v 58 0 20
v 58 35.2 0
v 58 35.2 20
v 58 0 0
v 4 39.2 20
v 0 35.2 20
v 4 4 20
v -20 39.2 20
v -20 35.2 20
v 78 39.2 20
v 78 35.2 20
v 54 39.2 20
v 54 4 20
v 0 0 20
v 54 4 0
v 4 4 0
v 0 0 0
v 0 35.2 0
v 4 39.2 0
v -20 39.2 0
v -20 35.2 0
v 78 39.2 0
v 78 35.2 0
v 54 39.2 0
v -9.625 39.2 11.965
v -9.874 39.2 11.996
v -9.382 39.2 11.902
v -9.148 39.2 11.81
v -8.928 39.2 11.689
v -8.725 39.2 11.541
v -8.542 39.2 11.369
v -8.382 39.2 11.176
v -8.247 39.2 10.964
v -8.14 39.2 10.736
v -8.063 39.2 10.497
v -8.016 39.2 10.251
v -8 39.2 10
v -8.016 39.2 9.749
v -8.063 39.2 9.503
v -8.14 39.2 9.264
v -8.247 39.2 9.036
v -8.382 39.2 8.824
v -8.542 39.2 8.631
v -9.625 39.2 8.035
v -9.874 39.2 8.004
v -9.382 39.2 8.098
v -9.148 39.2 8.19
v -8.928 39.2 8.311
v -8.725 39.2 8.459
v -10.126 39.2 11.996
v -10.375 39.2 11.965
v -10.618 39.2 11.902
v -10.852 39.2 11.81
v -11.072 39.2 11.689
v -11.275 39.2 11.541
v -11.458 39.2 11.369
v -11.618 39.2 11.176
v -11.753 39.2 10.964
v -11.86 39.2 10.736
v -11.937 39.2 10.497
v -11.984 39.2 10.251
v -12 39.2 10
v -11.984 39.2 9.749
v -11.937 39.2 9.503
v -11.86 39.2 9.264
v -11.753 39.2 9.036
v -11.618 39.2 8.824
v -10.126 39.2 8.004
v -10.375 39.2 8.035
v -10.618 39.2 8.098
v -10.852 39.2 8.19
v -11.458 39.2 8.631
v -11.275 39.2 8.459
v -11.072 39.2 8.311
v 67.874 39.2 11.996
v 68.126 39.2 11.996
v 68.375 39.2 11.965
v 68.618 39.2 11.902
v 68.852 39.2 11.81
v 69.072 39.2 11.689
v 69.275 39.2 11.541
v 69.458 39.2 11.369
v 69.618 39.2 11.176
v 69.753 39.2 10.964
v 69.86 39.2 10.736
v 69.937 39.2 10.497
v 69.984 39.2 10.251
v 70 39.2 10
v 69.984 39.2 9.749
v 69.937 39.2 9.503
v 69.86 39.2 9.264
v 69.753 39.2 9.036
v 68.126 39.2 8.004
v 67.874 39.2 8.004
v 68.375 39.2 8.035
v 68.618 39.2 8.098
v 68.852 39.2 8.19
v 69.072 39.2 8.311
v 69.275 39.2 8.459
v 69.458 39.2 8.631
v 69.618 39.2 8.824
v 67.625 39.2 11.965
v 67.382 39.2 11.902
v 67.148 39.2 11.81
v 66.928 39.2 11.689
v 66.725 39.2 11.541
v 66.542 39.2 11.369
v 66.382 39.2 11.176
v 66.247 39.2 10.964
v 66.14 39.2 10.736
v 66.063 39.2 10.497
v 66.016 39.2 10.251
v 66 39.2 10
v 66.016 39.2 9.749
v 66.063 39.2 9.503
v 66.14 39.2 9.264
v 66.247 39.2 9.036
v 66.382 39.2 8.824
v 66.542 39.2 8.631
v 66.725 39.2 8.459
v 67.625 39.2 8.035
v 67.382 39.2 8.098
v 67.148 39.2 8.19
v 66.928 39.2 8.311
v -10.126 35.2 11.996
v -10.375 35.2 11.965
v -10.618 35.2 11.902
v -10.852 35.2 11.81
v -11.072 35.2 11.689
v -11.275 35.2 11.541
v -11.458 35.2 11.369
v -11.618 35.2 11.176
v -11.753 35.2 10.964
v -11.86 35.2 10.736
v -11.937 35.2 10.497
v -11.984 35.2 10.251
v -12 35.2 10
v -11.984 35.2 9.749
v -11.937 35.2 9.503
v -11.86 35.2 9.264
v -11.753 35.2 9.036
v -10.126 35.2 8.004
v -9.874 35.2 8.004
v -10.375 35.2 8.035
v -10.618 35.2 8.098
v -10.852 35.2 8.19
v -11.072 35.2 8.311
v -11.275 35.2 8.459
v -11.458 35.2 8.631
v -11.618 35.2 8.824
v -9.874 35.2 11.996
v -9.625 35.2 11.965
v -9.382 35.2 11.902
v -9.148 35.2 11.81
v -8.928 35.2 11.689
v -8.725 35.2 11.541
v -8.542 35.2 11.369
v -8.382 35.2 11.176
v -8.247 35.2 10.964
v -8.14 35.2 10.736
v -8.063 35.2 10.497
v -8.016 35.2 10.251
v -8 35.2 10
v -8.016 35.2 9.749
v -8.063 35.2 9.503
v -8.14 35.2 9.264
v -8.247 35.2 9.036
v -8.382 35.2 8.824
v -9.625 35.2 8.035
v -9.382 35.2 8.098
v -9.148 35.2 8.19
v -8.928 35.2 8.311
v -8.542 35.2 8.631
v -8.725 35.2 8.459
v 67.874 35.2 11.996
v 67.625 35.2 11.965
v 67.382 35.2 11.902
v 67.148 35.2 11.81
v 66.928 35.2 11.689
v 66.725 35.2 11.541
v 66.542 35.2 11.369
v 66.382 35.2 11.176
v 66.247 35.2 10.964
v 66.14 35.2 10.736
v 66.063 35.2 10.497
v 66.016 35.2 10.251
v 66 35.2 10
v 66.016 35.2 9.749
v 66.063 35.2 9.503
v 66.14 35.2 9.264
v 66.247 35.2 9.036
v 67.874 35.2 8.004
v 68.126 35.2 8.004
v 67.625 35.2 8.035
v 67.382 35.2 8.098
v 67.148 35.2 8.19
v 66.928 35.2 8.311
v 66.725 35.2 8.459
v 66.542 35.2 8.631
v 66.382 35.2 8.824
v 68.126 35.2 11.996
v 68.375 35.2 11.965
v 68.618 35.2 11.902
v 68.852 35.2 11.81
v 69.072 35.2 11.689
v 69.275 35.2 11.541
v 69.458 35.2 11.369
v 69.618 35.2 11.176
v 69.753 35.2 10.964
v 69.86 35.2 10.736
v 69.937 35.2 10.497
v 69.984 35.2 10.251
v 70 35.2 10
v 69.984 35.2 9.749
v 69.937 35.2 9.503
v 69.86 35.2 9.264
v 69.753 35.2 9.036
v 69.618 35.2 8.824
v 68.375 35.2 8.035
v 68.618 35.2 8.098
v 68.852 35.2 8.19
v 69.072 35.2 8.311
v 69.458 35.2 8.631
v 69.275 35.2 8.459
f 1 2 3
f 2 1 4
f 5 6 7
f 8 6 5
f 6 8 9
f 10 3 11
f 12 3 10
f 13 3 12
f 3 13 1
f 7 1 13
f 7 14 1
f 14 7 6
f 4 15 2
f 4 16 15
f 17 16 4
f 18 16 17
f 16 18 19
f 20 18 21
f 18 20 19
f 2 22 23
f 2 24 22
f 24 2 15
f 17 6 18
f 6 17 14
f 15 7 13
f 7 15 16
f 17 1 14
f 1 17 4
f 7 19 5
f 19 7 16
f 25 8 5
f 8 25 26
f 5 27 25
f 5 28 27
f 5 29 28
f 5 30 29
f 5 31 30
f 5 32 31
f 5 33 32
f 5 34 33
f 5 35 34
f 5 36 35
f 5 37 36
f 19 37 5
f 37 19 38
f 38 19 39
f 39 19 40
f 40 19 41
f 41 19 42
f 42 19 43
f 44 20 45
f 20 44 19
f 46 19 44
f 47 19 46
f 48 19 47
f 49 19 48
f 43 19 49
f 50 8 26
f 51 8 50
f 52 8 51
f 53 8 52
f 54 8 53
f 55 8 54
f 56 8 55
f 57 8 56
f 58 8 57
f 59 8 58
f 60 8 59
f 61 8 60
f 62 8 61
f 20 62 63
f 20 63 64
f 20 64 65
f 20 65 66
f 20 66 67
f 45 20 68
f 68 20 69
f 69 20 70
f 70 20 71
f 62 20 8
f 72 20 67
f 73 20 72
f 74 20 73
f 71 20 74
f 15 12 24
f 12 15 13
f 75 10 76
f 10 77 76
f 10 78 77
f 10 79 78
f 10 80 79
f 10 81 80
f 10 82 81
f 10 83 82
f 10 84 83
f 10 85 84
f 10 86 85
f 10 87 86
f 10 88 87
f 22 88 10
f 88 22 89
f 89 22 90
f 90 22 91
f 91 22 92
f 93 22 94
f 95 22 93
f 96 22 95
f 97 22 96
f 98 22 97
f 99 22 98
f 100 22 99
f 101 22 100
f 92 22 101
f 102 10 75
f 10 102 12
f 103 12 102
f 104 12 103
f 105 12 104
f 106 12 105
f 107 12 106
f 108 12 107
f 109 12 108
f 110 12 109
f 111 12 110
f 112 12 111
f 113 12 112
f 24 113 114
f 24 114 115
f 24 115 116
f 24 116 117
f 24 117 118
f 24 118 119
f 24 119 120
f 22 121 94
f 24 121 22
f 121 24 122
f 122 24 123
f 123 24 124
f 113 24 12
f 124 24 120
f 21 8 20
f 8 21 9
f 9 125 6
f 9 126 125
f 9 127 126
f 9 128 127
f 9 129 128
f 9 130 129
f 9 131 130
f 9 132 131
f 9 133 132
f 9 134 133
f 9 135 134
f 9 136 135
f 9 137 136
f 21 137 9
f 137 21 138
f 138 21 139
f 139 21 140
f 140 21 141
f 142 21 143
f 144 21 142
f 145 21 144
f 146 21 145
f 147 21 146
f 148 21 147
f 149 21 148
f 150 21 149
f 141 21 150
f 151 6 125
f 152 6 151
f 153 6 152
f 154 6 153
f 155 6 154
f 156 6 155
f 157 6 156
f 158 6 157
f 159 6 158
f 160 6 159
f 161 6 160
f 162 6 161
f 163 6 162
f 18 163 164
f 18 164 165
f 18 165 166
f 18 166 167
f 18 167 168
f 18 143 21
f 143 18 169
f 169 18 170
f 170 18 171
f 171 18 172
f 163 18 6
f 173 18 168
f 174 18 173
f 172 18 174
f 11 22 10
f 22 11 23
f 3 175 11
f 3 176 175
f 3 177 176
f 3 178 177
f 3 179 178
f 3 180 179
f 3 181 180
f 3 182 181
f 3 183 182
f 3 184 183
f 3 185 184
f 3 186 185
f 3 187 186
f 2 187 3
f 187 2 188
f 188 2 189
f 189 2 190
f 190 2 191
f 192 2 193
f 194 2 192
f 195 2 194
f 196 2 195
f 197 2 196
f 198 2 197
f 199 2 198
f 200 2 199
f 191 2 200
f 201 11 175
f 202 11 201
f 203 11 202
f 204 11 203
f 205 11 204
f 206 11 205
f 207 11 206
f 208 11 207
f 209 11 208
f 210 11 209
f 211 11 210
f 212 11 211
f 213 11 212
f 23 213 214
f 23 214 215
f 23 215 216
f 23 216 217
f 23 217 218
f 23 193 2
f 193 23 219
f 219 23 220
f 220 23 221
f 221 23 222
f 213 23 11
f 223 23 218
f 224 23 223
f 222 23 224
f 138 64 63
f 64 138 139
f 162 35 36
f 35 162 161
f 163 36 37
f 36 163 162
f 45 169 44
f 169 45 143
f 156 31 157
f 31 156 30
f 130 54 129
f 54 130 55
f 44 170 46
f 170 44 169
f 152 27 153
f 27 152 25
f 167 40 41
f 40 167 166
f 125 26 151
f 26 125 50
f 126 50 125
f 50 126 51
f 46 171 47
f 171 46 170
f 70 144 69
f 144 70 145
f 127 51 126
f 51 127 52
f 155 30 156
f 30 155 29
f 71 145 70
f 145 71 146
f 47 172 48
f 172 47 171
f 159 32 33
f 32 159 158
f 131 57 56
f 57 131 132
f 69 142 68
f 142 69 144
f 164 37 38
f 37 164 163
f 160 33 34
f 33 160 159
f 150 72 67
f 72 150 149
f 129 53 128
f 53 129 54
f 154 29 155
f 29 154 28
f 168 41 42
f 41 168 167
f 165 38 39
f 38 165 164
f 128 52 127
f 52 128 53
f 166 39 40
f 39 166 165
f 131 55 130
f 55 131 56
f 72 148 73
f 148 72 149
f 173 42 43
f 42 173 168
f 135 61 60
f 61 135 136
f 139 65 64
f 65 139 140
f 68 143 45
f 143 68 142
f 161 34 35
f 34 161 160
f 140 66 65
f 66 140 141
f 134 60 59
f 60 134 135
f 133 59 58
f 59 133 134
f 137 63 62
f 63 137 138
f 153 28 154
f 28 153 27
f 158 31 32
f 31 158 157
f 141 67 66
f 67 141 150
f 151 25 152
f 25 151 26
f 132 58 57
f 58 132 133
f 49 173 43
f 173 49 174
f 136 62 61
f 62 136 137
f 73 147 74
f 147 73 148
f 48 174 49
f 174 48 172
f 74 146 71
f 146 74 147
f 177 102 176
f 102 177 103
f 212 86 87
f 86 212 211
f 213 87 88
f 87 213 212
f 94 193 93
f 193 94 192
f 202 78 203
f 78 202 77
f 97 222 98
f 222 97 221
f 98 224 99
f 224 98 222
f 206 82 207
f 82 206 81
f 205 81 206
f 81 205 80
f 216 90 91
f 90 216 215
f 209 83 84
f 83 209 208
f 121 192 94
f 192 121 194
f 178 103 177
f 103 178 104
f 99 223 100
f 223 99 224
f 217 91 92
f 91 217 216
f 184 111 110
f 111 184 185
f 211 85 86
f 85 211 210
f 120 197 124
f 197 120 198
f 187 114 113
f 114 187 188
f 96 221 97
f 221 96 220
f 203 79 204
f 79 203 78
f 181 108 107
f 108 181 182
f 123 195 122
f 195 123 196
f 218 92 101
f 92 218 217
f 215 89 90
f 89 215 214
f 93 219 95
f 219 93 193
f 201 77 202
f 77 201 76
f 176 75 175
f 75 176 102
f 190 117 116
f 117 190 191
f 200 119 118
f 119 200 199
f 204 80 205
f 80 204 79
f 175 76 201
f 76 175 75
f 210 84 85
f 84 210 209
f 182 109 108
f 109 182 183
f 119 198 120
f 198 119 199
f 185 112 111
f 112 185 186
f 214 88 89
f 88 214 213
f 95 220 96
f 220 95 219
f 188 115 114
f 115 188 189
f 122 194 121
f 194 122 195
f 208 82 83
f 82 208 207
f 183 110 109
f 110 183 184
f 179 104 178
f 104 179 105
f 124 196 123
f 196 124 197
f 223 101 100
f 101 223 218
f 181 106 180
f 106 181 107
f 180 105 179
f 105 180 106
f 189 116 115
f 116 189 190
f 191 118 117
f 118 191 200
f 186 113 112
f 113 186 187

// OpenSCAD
//
//
//  Parametric mounting bracket
//
//  All dimensions are in mm
//
//

InsideWidth = 50;   // width of object being held
InsideHeight = 35.2;  // height of object being held
Span = 20;          // how wide you want the bracket to be
Thickness = 4;      // how thick the bracket material will be
FlangeSize = 20;    // how far the mounting flanges will stick out
Hole = 1;           // 1 = Holes, 0 = No holes
HoleDiameter = 4;   // size of mounting holes on the flanges

// Ok, begin

difference () {

union () {

cube([InsideWidth+(Thickness*2),Thickness,Span]);
cube([Thickness, InsideHeight+Thickness,Span]);
translate([InsideWidth+Thickness,0,0]) 
  cube([Thickness, InsideHeight+Thickness,Span]);
translate([-FlangeSize, InsideHeight,0])
  cube([FlangeSize+Thickness,Thickness,Span]);
translate([InsideWidth+Thickness, InsideHeight,0])
  cube([FlangeSize+Thickness,Thickness,Span]);
}

 if (Hole) {
 translate([-FlangeSize/2,InsideHeight,Span/2]) 
     rotate ([90,0,0]) 
     cylinder (h = Thickness+7, r=HoleDiameter/2, center = true, $fn=50);
 translate([InsideWidth+(Thickness*2)+FlangeSize/2,InsideHeight,Span/2]) 
     rotate ([90,0,0]) 
     cylinder (h = Thickness+7, r=HoleDiameter/2, center = true, $fn=50);
 }
}
